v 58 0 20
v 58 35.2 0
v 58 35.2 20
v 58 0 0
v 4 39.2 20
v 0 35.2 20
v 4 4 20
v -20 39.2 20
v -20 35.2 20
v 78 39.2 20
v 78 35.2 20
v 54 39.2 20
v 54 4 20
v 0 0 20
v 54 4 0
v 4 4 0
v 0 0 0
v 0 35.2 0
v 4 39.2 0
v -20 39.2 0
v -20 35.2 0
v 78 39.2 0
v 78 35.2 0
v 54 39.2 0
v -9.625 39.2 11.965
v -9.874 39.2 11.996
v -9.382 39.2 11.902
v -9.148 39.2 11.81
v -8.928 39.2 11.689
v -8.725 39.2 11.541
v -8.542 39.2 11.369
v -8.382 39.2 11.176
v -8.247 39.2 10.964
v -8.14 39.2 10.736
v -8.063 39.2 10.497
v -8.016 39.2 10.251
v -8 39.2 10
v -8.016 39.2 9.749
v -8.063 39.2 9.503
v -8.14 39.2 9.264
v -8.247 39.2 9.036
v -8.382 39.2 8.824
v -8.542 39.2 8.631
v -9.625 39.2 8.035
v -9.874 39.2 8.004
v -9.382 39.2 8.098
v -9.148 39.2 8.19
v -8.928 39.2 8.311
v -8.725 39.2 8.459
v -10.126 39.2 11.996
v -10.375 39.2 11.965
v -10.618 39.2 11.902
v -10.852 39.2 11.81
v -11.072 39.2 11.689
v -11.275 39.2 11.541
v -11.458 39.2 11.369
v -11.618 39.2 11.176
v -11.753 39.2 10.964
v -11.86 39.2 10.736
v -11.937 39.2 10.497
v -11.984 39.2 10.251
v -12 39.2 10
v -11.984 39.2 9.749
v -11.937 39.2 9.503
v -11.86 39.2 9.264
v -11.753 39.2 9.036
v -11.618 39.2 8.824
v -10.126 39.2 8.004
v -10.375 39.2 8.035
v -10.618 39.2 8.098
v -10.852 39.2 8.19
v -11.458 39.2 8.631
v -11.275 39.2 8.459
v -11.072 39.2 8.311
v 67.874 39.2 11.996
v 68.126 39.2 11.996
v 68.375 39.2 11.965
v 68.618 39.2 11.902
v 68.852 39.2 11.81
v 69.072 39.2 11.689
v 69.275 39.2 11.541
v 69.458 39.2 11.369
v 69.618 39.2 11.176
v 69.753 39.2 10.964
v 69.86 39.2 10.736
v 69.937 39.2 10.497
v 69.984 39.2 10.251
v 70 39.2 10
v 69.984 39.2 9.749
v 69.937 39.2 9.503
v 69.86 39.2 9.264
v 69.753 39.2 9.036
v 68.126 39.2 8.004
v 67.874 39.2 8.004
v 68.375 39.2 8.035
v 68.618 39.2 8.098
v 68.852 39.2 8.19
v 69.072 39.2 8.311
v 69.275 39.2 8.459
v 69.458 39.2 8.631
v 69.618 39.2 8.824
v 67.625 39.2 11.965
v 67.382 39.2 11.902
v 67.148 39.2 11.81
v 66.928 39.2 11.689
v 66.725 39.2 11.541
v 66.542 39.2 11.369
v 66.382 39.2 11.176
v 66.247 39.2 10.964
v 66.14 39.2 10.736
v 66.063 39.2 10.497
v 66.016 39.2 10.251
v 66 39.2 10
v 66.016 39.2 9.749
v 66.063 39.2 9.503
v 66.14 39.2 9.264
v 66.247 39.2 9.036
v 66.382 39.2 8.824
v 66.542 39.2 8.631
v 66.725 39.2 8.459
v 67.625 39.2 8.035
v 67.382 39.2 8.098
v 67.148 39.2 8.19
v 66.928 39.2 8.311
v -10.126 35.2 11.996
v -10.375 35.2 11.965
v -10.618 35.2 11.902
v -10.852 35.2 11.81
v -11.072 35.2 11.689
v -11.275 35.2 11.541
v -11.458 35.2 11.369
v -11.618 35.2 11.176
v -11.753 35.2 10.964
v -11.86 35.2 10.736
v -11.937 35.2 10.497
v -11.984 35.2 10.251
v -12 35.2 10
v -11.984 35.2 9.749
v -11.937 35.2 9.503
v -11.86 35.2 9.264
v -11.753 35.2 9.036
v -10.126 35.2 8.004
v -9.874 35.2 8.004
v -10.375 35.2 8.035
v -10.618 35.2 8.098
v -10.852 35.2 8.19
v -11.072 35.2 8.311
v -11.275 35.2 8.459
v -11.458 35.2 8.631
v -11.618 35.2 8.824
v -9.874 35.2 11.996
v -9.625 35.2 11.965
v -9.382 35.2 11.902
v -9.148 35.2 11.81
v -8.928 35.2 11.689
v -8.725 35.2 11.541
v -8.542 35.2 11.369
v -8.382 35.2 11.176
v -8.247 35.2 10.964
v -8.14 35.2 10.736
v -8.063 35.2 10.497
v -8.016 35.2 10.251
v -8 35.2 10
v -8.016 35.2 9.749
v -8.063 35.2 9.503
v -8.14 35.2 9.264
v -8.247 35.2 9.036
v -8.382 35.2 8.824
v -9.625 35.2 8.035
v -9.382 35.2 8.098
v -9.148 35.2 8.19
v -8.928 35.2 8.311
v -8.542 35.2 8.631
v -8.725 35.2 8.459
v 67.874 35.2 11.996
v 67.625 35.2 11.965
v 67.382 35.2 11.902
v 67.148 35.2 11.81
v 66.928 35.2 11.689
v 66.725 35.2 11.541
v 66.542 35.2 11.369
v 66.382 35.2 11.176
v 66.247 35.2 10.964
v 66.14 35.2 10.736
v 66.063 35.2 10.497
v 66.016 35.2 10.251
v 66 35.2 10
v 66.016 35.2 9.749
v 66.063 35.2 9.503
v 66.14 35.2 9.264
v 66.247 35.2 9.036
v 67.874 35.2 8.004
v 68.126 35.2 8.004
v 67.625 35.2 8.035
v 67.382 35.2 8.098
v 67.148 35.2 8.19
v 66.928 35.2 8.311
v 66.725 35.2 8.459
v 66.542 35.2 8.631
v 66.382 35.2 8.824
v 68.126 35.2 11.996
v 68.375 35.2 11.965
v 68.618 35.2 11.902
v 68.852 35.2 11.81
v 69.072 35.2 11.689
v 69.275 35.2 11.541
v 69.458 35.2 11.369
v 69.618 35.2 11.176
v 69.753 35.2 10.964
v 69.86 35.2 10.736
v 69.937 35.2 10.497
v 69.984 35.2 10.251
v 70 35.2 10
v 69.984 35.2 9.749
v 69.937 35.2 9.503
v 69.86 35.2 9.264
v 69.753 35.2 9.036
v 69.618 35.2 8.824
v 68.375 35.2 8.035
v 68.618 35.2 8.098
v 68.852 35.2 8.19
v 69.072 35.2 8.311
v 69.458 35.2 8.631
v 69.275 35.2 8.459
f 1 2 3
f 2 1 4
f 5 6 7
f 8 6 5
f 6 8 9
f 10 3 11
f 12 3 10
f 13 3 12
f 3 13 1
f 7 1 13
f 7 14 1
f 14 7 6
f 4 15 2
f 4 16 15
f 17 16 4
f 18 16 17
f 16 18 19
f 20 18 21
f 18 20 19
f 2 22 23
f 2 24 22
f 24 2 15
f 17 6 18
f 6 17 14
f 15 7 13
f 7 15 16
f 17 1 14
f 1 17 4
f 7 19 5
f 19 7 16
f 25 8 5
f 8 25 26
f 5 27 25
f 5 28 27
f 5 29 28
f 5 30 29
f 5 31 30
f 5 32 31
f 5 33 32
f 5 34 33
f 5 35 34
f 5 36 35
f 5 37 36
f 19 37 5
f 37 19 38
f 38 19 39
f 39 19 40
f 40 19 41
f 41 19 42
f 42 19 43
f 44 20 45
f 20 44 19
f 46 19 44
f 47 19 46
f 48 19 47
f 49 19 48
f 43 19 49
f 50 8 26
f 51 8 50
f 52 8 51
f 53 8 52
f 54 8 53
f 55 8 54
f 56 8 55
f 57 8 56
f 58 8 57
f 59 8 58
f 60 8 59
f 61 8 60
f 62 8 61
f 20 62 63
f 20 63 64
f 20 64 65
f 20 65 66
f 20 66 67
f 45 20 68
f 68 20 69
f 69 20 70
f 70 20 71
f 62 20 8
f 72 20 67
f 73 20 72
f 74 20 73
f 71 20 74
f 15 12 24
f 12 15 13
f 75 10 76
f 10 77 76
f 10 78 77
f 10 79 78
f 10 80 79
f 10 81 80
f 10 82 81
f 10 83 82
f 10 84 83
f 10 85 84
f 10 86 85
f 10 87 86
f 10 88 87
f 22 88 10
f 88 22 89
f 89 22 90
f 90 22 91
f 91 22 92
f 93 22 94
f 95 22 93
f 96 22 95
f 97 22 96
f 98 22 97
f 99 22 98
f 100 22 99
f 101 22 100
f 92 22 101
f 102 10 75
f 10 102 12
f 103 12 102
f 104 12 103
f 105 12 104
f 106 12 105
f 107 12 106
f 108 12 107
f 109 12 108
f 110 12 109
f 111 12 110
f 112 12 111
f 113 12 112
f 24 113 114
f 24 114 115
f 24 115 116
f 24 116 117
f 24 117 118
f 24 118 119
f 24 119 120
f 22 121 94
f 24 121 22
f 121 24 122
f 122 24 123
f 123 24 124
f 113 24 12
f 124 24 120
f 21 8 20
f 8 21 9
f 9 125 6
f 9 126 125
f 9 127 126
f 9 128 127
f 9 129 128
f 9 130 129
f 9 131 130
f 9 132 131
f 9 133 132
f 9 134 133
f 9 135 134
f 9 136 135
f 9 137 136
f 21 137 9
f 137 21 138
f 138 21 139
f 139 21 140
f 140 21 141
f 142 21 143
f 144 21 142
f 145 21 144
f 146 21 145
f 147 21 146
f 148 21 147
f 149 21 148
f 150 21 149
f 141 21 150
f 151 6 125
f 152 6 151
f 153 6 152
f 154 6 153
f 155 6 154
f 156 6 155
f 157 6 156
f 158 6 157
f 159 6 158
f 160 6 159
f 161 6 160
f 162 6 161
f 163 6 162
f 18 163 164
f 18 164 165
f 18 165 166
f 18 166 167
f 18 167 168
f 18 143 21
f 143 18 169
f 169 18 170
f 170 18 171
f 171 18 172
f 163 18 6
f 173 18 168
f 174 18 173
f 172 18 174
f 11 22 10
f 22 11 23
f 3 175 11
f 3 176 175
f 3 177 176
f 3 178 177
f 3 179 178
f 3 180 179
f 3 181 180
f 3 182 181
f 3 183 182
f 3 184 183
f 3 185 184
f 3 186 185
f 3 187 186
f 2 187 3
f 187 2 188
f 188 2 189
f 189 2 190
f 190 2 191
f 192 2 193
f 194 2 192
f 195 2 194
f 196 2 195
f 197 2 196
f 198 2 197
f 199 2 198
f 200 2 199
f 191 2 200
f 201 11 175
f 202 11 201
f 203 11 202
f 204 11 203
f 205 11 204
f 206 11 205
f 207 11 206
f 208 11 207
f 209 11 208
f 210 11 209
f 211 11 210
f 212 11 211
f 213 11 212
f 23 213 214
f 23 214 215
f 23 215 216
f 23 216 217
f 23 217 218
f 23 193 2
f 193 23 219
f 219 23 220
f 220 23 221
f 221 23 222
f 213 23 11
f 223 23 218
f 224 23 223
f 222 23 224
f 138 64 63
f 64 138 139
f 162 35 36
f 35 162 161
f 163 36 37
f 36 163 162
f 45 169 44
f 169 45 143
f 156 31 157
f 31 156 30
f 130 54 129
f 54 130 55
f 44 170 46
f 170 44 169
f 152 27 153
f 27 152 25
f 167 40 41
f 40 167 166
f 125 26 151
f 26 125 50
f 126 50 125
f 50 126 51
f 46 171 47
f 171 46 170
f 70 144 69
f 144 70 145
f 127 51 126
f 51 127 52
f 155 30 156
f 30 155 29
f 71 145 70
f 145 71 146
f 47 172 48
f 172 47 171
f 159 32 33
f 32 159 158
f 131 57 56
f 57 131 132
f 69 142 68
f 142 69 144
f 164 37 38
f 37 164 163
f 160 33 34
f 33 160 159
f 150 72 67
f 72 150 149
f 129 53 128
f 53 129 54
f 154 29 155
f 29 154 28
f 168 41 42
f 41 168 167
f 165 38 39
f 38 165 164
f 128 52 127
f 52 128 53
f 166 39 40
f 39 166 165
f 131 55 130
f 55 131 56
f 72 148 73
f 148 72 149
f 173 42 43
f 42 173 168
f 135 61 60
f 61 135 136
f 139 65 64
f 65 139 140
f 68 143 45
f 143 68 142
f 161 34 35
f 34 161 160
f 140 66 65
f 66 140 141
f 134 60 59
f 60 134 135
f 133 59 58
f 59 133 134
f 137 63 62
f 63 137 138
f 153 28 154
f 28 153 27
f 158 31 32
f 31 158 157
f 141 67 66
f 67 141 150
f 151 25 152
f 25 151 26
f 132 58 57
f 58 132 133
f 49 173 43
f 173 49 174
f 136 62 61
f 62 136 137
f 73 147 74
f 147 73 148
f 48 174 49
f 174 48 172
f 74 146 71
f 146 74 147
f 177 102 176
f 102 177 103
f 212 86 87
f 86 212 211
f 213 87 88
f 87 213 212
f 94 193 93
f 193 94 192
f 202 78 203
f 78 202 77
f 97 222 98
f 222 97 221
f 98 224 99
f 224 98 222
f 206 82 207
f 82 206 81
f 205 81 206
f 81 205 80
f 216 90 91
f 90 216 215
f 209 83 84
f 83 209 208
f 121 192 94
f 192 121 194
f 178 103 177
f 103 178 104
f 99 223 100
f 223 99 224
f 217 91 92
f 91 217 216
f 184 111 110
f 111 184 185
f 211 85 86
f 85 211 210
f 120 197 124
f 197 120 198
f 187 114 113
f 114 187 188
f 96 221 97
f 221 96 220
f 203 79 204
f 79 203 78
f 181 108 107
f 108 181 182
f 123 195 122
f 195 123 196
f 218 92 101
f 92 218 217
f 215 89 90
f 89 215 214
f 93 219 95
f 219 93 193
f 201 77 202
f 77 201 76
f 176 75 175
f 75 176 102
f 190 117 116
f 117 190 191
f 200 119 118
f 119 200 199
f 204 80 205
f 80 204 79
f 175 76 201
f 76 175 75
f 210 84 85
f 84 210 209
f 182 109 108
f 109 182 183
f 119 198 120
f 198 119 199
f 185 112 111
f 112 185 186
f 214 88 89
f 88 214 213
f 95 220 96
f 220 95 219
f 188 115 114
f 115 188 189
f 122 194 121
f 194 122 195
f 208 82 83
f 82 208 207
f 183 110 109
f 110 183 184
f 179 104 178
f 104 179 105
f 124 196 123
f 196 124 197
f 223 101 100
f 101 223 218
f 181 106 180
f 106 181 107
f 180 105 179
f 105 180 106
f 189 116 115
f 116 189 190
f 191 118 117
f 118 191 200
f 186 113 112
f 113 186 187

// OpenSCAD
//
//
//  Parametric mounting bracket
//
//  All dimensions are in mm
//
//

InsideWidth = 50;   // width of object being held
InsideHeight = 35.2;  // height of object being held
Span = 20;          // how wide you want the bracket to be
Thickness = 4;      // how thick the bracket material will be
FlangeSize = 20;    // how far the mounting flanges will stick out
Hole = 1;           // 1 = Holes, 0 = No holes
HoleDiameter = 4;   // size of mounting holes on the flanges

// Ok, begin

difference () {

union () {

cube([InsideWidth+(Thickness*2),Thickness,Span]);
cube([Thickness, InsideHeight+Thickness,Span]);
translate([InsideWidth+Thickness,0,0]) 
  cube([Thickness, InsideHeight+Thickness,Span]);
translate([-FlangeSize, InsideHeight,0])
  cube([FlangeSize+Thickness,Thickness,Span]);
translate([InsideWidth+Thickness, InsideHeight,0])
  cube([FlangeSize+Thickness,Thickness,Span]);
}

 if (Hole) {
 translate([-FlangeSize/2,InsideHeight,Span/2]) 
     rotate ([90,0,0]) 
     cylinder (h = Thickness+7, r=HoleDiameter/2, center = true, $fn=50);
 translate([InsideWidth+(Thickness*2)+FlangeSize/2,InsideHeight,Span/2]) 
     rotate ([90,0,0]) 
     cylinder (h = Thickness+7, r=HoleDiameter/2, center = true, $fn=50);
 }
}
